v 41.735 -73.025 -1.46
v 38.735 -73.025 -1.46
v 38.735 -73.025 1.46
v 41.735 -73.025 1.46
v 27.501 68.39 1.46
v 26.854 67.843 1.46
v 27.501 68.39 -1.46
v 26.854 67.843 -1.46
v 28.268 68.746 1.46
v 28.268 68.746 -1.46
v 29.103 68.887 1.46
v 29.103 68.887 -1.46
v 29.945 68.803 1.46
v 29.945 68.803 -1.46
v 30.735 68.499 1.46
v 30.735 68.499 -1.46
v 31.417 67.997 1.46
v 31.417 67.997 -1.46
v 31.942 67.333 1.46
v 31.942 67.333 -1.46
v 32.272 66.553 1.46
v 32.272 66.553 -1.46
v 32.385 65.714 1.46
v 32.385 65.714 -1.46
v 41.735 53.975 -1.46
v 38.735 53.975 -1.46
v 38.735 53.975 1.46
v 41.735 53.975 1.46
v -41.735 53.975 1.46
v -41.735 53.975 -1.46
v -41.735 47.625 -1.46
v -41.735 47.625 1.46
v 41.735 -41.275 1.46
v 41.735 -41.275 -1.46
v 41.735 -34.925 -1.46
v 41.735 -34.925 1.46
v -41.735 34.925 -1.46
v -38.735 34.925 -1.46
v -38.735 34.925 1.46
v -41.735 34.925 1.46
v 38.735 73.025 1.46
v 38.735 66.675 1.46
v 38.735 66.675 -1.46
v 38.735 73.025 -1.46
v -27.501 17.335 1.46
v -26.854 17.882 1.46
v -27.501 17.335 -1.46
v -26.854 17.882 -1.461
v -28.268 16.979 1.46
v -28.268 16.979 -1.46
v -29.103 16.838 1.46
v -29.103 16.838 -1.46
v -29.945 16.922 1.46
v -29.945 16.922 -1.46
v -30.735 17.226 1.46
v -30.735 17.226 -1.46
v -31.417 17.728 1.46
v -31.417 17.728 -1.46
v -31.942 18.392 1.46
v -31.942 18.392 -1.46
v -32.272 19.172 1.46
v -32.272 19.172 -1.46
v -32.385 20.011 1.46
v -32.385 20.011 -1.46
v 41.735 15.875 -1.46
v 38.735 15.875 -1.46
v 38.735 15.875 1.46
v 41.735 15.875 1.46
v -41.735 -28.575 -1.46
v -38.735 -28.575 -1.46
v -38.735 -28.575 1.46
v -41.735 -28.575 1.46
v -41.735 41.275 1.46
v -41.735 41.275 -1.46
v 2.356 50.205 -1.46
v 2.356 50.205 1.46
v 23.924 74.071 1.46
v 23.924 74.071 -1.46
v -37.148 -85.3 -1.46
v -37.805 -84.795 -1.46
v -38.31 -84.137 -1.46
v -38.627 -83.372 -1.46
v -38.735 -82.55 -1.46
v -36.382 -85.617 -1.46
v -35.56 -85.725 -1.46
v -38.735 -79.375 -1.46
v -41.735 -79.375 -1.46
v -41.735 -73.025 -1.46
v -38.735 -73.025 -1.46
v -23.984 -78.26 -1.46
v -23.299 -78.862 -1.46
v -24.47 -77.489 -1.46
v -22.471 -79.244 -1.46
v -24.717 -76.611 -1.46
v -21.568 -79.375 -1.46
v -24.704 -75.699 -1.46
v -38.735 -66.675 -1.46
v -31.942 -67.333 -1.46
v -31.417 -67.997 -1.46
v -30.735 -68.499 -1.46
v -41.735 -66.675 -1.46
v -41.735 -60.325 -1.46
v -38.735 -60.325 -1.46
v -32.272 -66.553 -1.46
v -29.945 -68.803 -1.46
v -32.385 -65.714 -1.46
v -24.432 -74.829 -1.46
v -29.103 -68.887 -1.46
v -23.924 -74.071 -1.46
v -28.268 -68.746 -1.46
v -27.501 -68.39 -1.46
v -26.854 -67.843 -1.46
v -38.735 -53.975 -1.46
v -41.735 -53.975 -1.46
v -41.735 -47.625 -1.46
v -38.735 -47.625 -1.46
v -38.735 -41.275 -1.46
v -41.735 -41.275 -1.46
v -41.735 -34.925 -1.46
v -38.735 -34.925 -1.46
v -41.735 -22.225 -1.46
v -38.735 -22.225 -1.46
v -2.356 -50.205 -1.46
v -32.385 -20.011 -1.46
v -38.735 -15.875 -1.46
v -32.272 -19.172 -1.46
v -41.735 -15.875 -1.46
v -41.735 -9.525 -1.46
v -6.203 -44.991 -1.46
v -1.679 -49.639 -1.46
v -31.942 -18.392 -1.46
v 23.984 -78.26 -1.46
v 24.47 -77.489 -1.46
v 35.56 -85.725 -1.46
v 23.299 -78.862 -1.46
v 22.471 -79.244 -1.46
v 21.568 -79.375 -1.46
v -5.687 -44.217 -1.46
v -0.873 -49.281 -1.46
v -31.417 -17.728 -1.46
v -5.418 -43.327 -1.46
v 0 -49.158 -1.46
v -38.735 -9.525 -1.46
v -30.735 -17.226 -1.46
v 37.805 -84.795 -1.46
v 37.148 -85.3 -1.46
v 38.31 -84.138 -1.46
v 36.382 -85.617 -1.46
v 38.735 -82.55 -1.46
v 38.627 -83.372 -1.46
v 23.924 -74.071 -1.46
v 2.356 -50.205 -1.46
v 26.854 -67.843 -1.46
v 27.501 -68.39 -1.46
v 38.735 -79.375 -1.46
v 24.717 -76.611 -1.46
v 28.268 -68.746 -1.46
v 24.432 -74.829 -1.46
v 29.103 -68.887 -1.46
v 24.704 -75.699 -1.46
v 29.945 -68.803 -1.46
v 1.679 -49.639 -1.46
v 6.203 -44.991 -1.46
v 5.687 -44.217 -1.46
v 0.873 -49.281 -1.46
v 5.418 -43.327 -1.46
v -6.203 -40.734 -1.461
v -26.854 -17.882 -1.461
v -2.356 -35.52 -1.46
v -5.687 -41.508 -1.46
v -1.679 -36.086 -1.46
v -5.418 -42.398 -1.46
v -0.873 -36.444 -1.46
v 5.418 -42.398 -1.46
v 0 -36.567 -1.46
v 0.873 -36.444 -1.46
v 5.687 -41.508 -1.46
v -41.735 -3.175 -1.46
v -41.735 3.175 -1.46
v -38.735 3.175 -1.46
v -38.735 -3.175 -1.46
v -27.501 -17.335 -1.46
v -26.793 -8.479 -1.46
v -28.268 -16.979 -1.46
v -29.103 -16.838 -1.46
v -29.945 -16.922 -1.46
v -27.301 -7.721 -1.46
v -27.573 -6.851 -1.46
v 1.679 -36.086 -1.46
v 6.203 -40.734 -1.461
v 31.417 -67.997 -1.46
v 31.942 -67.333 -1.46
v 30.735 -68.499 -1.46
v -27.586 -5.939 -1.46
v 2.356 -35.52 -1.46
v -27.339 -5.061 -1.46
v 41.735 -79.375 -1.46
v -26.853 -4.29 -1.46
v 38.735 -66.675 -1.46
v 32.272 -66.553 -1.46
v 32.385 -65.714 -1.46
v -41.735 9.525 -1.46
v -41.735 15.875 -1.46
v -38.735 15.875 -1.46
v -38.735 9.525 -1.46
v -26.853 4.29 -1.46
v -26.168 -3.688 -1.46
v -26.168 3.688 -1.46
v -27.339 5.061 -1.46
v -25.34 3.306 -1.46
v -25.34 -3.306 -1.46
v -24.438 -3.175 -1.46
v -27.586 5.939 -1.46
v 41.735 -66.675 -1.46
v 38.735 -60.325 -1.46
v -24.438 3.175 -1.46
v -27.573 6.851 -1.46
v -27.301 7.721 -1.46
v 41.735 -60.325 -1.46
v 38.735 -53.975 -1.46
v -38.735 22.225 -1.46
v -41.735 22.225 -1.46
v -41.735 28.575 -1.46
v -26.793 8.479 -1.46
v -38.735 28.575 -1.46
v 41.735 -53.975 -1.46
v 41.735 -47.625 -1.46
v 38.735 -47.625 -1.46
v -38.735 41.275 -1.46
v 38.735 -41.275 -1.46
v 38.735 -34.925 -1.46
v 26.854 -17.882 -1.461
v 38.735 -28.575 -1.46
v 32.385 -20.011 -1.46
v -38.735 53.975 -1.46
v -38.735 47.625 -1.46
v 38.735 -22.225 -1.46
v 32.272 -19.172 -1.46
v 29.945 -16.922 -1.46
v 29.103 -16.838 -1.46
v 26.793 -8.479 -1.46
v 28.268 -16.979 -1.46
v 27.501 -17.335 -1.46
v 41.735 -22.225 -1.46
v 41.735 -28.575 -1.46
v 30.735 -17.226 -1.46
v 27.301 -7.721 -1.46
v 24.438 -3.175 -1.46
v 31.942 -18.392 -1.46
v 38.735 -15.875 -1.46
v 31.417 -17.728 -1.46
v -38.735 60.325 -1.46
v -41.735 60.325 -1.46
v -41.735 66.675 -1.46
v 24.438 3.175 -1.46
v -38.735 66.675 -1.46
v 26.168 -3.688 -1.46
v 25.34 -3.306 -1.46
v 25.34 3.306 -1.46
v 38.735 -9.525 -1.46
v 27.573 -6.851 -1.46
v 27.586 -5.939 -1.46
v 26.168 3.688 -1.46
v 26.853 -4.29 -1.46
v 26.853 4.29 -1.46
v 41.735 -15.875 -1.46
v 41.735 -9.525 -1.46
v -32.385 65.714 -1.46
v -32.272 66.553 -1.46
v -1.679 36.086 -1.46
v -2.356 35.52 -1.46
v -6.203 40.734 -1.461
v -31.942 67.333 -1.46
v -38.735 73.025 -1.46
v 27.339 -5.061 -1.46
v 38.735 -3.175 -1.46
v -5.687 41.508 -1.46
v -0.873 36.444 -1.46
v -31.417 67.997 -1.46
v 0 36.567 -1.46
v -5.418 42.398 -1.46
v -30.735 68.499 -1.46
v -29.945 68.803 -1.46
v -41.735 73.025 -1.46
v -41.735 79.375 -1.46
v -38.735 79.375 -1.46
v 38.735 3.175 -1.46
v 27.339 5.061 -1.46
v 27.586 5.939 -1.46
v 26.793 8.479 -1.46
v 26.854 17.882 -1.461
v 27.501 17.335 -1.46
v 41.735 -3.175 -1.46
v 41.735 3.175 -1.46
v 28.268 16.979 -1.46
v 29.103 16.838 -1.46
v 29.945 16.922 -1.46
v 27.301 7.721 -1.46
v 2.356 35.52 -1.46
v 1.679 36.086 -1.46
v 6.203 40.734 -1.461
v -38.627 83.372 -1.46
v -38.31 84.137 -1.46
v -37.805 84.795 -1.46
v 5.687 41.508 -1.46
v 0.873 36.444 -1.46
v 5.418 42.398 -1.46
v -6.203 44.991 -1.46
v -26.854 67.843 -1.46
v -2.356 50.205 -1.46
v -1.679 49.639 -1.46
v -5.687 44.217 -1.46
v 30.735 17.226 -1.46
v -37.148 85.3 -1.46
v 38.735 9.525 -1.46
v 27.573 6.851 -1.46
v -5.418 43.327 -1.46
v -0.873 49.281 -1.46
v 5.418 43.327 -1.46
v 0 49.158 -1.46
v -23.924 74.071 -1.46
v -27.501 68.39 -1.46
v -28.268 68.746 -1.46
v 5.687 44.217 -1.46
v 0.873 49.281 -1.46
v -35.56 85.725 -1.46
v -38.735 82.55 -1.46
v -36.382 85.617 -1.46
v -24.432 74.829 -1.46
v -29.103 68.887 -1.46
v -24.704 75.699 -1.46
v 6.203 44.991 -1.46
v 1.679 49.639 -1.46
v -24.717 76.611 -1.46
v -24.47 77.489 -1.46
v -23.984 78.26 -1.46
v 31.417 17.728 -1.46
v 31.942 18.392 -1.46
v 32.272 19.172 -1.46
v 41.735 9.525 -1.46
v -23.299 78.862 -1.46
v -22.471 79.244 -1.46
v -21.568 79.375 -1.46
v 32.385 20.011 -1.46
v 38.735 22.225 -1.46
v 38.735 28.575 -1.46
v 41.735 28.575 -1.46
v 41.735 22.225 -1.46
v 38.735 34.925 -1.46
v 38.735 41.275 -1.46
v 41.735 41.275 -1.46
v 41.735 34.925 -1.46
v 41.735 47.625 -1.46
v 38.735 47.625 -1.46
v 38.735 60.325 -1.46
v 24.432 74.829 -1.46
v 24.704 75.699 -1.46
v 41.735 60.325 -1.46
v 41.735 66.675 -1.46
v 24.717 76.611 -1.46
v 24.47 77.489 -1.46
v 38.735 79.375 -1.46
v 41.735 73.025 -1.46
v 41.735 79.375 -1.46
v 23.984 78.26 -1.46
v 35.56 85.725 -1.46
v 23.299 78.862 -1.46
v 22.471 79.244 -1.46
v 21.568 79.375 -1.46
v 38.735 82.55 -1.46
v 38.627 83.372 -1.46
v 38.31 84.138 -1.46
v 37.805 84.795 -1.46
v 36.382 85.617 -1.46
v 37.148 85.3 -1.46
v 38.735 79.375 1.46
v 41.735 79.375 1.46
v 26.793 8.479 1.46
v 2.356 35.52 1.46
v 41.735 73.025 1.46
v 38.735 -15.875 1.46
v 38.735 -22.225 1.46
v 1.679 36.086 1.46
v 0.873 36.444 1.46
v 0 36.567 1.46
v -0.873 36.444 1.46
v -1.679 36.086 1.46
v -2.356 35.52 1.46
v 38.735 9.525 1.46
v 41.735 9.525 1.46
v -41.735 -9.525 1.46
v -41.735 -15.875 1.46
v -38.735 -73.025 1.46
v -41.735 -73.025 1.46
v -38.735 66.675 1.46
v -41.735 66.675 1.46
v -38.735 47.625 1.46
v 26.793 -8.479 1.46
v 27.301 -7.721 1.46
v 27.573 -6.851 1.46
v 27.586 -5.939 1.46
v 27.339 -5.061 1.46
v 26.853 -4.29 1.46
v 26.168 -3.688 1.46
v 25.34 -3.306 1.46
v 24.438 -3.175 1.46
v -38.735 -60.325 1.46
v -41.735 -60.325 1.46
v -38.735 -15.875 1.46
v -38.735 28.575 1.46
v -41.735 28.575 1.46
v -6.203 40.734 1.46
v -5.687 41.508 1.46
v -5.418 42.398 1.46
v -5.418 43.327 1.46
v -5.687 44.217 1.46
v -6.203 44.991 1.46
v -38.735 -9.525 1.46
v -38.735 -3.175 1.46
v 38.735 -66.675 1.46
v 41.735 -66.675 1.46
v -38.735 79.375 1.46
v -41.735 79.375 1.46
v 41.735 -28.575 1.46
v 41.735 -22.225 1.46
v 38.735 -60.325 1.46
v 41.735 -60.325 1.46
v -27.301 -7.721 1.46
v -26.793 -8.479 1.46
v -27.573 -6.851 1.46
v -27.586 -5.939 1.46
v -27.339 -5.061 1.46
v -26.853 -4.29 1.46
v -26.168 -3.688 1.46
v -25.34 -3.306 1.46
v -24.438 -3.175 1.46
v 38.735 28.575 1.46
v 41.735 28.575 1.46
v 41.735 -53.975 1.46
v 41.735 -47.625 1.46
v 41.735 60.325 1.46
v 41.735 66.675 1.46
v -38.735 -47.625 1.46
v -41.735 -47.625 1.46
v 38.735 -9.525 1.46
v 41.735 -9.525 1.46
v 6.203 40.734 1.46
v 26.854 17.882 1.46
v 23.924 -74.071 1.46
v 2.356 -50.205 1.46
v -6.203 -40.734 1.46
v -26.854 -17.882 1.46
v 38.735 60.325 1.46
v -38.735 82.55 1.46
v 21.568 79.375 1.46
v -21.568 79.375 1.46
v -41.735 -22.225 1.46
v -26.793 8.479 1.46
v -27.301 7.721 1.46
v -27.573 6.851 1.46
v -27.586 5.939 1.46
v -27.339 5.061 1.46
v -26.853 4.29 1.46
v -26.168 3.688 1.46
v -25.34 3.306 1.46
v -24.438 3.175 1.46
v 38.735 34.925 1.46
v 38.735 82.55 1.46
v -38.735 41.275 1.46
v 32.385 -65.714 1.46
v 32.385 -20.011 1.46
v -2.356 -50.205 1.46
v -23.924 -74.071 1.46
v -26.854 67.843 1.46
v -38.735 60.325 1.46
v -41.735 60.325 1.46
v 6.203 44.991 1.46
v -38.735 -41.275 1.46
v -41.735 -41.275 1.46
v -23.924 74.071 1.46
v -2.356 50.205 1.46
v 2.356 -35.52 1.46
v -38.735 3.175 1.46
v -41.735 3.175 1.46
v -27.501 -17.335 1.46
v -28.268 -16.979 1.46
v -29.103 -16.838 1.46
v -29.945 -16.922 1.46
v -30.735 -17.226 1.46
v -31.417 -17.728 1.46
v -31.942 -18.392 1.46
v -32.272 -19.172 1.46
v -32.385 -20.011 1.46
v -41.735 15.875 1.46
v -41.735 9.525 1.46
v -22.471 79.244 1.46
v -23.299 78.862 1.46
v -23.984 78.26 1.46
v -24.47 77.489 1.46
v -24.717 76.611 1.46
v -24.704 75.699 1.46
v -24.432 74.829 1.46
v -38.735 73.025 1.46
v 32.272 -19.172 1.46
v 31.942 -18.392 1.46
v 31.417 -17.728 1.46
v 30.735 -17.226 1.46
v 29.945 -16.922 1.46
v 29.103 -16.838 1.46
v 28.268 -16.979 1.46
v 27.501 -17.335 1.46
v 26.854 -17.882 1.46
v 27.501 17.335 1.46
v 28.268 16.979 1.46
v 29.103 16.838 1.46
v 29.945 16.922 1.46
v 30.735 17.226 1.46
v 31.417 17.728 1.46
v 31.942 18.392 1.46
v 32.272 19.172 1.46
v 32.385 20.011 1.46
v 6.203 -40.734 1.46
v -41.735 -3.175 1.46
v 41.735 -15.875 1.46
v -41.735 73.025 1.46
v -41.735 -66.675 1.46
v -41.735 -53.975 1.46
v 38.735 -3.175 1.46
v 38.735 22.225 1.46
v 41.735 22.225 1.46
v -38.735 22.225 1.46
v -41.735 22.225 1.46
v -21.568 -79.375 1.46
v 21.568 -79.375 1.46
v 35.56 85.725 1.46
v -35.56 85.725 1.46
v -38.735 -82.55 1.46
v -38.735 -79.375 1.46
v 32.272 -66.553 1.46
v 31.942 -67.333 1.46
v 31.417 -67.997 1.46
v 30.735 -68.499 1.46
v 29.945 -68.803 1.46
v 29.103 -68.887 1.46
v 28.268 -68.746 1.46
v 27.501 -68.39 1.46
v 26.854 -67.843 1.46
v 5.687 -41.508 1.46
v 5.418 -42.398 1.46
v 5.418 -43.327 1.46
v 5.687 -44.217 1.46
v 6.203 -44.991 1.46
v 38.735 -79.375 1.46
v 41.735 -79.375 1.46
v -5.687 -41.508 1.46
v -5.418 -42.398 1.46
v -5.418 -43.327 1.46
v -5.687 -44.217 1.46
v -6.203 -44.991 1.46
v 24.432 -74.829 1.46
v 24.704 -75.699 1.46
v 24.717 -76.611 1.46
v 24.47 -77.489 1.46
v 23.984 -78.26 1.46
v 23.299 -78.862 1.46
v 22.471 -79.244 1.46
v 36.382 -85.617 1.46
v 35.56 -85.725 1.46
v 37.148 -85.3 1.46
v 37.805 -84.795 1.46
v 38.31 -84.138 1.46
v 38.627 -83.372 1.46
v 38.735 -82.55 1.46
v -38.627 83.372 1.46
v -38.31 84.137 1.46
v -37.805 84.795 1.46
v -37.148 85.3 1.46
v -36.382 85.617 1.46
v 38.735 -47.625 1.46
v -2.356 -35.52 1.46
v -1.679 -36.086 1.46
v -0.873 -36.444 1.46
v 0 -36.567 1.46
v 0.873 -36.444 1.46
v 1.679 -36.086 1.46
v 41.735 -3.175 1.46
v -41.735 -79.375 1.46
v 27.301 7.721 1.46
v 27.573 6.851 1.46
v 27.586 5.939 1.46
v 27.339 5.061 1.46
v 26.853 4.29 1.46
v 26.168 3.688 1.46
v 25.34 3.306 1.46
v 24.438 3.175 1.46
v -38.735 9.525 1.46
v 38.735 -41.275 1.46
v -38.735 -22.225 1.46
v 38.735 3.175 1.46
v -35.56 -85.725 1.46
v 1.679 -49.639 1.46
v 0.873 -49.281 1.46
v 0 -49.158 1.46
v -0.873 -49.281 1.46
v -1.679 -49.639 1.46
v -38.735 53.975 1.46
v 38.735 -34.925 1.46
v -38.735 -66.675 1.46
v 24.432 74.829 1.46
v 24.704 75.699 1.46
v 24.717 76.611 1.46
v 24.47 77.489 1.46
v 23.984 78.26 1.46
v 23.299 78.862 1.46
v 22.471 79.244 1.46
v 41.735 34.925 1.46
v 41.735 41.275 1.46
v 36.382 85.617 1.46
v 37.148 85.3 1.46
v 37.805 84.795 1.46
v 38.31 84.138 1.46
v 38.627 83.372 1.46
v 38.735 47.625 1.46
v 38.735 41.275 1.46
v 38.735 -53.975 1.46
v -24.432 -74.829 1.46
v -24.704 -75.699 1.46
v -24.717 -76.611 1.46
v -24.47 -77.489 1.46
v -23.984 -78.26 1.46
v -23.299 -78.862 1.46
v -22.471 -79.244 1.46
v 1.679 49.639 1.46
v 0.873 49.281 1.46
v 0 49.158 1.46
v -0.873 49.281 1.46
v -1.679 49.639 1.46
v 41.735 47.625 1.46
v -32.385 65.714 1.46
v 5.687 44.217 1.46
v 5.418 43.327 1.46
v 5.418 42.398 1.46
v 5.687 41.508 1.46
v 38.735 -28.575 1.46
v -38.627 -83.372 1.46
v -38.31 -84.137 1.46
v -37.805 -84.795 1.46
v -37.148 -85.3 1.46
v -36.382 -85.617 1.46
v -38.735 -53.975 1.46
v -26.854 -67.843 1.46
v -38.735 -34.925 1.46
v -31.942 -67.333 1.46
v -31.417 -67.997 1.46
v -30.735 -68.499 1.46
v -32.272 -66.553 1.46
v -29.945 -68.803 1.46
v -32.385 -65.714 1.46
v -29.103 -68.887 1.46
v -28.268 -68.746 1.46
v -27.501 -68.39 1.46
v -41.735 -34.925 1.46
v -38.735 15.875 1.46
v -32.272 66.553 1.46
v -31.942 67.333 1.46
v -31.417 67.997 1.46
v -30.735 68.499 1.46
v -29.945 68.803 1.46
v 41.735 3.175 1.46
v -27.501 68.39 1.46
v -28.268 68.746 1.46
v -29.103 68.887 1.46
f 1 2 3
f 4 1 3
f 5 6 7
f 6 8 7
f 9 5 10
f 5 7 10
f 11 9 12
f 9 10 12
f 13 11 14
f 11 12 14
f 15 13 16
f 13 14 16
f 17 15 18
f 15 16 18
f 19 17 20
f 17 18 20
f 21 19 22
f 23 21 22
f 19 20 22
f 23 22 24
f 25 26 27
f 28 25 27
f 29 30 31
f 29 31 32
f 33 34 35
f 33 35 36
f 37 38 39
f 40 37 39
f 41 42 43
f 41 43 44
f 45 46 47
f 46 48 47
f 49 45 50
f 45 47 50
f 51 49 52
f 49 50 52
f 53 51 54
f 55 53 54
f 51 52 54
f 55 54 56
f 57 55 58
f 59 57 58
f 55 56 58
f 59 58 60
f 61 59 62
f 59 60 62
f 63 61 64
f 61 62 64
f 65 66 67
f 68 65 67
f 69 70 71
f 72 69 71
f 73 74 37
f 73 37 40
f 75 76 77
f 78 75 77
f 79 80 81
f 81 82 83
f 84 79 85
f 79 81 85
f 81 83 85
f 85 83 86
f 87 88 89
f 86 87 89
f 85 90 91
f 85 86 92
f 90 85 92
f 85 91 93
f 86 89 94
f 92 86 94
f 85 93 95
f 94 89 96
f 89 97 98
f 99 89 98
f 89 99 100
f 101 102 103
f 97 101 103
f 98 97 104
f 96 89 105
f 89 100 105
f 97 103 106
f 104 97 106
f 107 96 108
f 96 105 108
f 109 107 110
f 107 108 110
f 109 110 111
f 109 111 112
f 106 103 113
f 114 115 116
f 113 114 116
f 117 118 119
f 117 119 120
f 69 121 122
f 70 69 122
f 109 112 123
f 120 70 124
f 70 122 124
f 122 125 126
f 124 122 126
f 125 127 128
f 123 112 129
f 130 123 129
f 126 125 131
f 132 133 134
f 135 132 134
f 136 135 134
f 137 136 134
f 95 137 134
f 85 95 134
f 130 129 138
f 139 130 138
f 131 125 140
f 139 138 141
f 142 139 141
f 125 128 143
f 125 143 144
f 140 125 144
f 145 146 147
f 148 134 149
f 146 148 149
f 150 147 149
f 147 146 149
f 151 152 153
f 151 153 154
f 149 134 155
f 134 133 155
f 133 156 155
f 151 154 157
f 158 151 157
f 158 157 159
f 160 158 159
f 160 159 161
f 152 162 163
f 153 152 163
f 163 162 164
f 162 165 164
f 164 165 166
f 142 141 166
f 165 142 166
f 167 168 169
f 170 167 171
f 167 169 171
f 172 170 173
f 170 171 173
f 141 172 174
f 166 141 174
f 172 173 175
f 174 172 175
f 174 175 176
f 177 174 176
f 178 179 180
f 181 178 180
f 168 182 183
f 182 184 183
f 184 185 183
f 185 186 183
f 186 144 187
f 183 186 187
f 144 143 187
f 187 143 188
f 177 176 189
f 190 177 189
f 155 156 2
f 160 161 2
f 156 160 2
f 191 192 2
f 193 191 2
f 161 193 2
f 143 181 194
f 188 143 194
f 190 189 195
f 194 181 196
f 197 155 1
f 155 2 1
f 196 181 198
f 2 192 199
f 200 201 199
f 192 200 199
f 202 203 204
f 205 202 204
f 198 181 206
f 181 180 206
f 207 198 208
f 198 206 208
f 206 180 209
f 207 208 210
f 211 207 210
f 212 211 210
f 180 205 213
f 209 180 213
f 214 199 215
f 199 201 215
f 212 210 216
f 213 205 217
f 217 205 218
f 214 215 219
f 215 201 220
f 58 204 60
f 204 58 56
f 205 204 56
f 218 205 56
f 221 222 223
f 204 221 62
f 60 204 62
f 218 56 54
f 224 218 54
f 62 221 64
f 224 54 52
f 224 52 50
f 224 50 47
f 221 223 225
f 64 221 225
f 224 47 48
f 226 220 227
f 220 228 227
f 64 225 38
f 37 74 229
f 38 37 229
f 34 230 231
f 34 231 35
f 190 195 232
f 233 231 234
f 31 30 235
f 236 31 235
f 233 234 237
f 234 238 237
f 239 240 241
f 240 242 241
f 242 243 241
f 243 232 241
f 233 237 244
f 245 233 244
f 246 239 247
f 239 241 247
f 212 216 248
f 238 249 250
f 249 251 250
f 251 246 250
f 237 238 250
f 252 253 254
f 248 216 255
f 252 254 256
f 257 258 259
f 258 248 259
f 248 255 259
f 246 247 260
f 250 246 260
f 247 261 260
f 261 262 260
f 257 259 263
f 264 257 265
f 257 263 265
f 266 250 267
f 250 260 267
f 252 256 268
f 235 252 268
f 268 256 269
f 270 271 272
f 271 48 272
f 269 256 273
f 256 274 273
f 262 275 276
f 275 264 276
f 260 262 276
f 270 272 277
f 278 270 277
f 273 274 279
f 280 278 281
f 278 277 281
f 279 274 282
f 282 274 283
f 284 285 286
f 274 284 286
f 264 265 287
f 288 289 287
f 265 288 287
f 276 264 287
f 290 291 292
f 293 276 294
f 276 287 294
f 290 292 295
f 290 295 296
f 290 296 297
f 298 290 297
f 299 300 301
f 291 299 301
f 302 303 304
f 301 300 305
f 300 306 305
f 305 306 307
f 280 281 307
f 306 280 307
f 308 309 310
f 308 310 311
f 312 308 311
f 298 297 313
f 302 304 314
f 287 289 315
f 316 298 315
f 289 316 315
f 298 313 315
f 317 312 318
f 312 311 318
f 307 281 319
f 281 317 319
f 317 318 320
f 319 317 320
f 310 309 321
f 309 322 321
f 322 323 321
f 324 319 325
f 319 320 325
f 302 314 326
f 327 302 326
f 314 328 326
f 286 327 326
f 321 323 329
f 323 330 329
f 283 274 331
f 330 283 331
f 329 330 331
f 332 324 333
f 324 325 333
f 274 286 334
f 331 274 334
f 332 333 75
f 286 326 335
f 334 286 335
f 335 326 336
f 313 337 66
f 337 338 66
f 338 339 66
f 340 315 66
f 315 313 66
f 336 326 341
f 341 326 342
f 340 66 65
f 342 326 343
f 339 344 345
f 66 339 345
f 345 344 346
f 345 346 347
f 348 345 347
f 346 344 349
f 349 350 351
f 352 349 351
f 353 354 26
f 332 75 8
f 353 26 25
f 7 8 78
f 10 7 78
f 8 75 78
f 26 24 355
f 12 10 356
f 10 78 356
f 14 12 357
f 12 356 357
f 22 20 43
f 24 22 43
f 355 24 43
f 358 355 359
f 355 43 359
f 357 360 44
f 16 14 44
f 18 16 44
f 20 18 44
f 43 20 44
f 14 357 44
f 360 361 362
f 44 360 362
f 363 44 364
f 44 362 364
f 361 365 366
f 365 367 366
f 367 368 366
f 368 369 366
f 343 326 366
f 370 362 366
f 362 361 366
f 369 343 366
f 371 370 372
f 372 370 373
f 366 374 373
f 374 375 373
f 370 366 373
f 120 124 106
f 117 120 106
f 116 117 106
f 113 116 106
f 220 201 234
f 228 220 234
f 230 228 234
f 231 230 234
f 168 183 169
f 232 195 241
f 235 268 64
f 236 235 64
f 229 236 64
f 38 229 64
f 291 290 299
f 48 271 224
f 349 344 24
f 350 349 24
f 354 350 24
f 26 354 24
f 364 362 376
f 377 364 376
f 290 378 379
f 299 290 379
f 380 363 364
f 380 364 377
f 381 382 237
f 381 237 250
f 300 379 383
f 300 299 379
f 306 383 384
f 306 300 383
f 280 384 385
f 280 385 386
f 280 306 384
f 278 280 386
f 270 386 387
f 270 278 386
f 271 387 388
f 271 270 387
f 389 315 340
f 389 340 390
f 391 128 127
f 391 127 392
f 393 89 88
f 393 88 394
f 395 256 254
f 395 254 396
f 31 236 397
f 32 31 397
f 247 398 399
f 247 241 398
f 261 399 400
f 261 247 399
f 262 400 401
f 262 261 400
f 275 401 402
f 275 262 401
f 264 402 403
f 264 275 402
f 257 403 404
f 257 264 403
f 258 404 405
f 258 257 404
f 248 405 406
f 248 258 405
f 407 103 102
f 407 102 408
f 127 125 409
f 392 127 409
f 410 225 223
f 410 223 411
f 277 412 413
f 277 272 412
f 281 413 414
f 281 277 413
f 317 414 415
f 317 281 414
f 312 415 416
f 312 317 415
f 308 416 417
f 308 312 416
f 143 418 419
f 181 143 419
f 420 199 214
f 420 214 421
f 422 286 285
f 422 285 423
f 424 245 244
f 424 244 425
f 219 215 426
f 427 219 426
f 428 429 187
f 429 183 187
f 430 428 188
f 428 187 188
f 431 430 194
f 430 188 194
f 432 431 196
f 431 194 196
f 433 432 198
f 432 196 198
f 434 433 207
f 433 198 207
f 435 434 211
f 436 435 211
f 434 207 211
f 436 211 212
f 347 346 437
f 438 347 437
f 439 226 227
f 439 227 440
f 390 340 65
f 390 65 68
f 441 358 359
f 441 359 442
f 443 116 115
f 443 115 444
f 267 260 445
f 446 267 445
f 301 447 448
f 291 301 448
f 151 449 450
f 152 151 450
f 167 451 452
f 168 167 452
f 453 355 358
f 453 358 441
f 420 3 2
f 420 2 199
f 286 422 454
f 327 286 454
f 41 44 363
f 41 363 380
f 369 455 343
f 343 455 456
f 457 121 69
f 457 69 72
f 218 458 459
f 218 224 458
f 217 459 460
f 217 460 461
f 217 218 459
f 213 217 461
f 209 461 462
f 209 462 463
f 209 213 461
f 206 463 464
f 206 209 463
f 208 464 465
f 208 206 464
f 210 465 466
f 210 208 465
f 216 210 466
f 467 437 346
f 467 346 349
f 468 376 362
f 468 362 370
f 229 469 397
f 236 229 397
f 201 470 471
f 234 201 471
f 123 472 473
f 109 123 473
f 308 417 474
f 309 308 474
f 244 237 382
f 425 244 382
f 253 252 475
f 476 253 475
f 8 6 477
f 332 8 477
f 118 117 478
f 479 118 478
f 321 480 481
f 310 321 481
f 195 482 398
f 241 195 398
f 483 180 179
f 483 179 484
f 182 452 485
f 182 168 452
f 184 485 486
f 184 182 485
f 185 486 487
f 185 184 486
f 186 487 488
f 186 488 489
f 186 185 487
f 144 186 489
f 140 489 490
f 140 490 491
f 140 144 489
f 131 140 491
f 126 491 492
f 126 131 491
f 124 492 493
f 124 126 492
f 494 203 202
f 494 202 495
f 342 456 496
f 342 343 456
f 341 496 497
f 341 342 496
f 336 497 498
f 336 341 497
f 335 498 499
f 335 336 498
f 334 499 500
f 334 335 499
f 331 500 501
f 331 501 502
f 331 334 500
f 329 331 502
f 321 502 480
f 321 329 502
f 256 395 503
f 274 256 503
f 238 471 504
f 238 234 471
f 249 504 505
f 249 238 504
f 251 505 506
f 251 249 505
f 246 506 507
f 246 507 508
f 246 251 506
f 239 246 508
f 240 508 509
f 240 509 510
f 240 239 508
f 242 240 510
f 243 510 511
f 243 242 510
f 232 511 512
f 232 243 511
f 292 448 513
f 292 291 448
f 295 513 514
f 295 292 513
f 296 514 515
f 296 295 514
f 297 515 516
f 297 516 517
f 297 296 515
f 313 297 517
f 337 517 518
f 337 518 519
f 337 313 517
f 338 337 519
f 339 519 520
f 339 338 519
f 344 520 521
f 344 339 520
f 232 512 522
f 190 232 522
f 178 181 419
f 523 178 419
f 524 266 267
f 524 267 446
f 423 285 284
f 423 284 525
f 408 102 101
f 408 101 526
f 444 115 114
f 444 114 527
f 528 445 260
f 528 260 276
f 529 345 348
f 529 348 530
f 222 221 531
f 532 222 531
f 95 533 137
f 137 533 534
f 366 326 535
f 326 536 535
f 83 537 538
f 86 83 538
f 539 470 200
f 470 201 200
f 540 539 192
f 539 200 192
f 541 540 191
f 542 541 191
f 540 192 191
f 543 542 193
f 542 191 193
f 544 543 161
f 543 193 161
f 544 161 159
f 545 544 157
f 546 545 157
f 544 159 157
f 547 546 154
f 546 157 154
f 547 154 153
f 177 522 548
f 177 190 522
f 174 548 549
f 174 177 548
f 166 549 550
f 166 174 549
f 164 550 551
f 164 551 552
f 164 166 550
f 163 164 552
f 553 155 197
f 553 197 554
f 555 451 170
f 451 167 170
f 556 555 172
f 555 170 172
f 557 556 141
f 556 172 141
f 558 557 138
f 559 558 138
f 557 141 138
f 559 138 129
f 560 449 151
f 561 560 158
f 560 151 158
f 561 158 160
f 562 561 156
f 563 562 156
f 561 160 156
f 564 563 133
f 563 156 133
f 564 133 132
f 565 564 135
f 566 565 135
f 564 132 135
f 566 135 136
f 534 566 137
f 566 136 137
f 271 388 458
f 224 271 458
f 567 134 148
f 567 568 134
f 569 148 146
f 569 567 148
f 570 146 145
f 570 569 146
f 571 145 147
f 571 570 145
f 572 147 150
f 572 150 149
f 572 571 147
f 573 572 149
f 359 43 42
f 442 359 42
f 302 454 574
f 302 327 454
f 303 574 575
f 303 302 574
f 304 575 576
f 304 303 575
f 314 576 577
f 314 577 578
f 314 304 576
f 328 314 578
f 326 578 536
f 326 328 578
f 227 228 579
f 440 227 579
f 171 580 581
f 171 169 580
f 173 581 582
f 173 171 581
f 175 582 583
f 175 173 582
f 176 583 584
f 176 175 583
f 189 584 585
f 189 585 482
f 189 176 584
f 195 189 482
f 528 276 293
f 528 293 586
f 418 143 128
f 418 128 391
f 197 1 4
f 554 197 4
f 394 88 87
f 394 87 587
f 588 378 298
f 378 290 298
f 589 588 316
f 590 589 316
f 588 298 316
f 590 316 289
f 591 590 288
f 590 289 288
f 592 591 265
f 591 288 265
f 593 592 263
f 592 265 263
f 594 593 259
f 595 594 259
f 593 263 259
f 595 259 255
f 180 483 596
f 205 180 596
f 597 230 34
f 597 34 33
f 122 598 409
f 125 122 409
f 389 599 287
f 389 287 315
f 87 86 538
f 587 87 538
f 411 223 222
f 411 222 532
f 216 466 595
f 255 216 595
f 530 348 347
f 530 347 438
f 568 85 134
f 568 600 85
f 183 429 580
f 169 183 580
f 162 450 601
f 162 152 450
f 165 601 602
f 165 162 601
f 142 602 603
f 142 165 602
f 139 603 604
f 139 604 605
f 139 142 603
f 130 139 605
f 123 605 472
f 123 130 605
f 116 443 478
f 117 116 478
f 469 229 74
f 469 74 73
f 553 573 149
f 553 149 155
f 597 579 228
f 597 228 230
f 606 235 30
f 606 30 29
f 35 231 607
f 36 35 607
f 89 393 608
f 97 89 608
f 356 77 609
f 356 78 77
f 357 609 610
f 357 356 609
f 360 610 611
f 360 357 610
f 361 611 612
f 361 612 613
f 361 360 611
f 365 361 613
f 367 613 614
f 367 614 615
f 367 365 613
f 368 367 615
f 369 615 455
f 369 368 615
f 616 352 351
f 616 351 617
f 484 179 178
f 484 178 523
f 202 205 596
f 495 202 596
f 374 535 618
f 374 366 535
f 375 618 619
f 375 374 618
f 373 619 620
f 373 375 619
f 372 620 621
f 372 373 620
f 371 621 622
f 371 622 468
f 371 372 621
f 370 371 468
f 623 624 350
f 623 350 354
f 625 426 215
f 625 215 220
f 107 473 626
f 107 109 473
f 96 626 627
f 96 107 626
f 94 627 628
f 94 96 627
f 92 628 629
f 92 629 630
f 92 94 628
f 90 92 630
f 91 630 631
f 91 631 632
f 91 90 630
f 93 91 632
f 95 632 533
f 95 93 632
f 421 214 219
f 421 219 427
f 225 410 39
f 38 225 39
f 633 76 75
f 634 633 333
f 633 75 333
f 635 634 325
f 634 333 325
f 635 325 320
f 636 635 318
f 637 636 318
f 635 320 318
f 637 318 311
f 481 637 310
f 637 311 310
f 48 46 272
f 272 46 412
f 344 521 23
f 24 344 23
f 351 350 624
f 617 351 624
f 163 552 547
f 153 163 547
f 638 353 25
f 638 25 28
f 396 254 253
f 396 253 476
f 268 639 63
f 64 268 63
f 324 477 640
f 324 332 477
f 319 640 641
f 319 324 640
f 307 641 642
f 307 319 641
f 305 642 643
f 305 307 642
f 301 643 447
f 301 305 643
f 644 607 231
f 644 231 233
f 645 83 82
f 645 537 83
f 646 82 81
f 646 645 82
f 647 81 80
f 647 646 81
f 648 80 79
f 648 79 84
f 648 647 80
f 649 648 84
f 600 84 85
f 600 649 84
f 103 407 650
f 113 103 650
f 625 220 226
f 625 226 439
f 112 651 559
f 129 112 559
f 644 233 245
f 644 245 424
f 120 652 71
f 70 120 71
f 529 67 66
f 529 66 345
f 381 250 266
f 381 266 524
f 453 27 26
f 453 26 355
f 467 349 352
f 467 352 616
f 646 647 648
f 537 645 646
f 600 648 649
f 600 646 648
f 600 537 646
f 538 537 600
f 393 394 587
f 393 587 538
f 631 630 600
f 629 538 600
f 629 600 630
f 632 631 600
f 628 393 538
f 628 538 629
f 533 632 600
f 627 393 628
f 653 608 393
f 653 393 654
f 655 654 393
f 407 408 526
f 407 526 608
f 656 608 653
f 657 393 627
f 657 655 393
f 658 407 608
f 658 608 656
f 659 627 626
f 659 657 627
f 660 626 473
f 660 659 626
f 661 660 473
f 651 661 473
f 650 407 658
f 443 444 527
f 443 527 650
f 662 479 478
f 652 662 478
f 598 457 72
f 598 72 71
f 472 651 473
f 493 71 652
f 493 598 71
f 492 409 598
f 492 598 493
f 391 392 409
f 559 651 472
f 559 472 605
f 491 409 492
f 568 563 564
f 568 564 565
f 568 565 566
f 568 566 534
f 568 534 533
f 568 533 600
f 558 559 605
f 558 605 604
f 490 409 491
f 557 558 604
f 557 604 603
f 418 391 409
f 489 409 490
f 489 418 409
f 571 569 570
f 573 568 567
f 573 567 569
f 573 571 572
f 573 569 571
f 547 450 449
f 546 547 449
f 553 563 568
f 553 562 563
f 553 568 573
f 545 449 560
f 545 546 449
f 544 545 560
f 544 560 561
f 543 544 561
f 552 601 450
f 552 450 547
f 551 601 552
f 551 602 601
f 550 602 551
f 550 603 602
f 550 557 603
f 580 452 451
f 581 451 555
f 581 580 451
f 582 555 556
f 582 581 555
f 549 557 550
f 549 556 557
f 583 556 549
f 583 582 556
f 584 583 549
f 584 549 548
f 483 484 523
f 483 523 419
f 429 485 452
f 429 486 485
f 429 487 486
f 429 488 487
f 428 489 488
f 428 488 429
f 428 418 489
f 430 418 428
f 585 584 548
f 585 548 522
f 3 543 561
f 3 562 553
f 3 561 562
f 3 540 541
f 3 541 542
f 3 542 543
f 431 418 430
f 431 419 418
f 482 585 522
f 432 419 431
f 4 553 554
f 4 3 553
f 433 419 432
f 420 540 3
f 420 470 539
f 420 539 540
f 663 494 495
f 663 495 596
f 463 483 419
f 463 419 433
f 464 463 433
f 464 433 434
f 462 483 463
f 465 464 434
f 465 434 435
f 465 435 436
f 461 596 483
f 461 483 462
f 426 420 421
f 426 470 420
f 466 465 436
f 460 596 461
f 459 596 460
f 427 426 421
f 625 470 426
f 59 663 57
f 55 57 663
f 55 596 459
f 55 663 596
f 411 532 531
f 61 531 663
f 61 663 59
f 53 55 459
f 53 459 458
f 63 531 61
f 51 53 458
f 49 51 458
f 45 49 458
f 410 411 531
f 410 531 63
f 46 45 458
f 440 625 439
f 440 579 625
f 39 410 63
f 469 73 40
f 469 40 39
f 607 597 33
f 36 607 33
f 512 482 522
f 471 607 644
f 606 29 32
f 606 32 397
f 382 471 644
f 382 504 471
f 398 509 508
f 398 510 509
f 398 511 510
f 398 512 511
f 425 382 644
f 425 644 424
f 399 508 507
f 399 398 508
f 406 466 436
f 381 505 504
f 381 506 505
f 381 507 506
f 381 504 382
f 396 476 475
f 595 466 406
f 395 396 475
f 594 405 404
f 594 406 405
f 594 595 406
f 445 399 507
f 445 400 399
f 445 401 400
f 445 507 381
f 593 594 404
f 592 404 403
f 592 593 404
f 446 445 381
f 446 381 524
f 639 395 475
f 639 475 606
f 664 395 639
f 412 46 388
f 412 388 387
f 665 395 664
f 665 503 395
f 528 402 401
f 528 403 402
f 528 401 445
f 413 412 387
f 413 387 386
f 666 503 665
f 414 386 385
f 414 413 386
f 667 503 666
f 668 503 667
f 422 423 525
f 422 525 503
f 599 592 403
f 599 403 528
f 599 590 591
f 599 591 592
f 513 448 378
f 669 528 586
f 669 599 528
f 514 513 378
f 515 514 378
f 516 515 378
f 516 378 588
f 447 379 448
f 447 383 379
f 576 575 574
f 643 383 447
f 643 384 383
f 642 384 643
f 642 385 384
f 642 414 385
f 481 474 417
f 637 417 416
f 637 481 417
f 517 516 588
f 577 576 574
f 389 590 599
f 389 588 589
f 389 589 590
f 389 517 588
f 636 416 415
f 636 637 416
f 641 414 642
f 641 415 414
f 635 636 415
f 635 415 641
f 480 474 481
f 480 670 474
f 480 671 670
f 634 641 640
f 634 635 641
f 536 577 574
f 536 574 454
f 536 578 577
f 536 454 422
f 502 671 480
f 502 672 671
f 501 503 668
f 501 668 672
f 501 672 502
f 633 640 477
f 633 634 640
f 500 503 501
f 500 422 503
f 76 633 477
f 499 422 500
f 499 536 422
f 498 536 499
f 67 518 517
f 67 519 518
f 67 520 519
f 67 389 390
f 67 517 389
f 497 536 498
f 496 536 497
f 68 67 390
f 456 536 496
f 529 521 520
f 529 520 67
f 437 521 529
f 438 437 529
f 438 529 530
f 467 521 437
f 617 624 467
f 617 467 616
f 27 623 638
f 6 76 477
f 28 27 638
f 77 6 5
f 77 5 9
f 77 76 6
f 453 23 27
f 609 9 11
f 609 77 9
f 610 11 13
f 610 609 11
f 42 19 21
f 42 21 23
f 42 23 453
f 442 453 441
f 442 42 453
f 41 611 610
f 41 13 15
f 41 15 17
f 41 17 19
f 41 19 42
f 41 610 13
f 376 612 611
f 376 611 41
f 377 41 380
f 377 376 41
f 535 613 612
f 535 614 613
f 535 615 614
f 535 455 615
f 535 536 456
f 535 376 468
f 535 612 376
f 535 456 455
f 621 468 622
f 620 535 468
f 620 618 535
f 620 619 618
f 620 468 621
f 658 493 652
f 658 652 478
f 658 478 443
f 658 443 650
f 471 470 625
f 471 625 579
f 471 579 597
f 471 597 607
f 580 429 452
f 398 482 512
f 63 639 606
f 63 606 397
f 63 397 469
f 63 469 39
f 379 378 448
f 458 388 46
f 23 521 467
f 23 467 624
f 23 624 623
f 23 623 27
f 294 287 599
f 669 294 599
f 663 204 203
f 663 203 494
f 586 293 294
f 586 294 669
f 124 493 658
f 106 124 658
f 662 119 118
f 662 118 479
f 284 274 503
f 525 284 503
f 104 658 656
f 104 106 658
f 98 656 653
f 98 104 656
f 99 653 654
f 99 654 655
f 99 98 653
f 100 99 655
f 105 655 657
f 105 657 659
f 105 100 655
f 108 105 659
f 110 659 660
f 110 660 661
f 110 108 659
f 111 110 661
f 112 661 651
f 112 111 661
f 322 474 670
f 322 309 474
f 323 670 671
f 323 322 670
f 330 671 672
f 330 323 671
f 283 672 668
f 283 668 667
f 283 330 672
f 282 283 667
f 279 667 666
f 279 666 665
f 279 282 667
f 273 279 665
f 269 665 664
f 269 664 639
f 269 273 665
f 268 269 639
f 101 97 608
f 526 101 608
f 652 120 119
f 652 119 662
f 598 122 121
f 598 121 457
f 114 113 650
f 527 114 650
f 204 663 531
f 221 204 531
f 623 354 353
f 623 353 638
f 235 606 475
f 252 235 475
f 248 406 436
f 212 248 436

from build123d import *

# Parameters (mm, degrees)
SKETCH1_W                = 77.47
SKETCH1_H                = 171.45
BOSS_EXTRUDE1_DEPTH      = 1.4605
SKETCH3_W                = 2.921
SKETCH3_H                = 6.35
BOSS_EXTRUDE2_DEPTH      = 3
LPATTERN1_COUNT          = 13
LPATTERN1_PITCH          = 12.7
MIRROR1_COPY_1_SKETCH_W  = 2.921
MIRROR1_COPY_1_SKETCH_H  = 6.35
MIRROR1_COPY_1_DEPTH     = 3
MIRROR1_COPY_2_SKETCH_W  = 2.921
MIRROR1_COPY_2_SKETCH_H  = 6.35
MIRROR1_COPY_2_DEPTH     = 3
MIRROR1_COPY_3_SKETCH_W  = 2.921
MIRROR1_COPY_3_SKETCH_H  = 6.35
MIRROR1_COPY_3_DEPTH     = 3
MIRROR1_COPY_4_SKETCH_W  = 2.921
MIRROR1_COPY_4_SKETCH_H  = 6.35
MIRROR1_COPY_4_DEPTH     = 3
MIRROR1_COPY_5_SKETCH_W  = 2.921
MIRROR1_COPY_5_SKETCH_H  = 6.35
MIRROR1_COPY_5_DEPTH     = 3
MIRROR1_COPY_6_SKETCH_W  = 2.921
MIRROR1_COPY_6_SKETCH_H  = 6.35
MIRROR1_COPY_6_DEPTH     = 3
MIRROR1_COPY_7_SKETCH_W  = 2.921
MIRROR1_COPY_7_SKETCH_H  = 6.35
MIRROR1_COPY_7_DEPTH     = 3
MIRROR1_COPY_8_SKETCH_W  = 2.921
MIRROR1_COPY_8_SKETCH_H  = 6.35
MIRROR1_COPY_8_DEPTH     = 3
MIRROR1_COPY_9_SKETCH_W  = 2.921
MIRROR1_COPY_9_SKETCH_H  = 6.35
MIRROR1_COPY_9_DEPTH     = 3
MIRROR1_COPY_10_SKETCH_W = 2.921
MIRROR1_COPY_10_SKETCH_H = 6.35
MIRROR1_COPY_10_DEPTH    = 3
MIRROR1_COPY_11_SKETCH_W = 2.921
MIRROR1_COPY_11_SKETCH_H = 6.35
MIRROR1_COPY_11_DEPTH    = 3
MIRROR1_COPY_12_SKETCH_W = 2.921
MIRROR1_COPY_12_SKETCH_H = 6.35
MIRROR1_COPY_12_DEPTH    = 3
CUT_EXTRUDE1_DEPTH       = 96.389297571
FILLET1_R                = 3.175
FILLET2_R                = 3.175


with BuildPart() as part:
    # Sketch1 → Boss-Extrude1 (new, symmetric)
    with BuildSketch(Plane.XY):
        Rectangle(SKETCH1_W, SKETCH1_H)
    extrude(amount=BOSS_EXTRUDE1_DEPTH, both=True)

    # Sketch3 → Boss-Extrude2 (add)
    with BuildSketch(Plane.ZY.offset(38.735)):
        with Locations((0, -76.2)):
            Rectangle(SKETCH3_W, SKETCH3_H)
    boss_extrude2 = extrude(amount=BOSS_EXTRUDE2_DEPTH)

    # LPattern1: Boss-Extrude2 ×13
    with Locations(*[(0, i * LPATTERN1_PITCH, 0) for i in range(1, LPATTERN1_COUNT)]):
        add(boss_extrude2)

    # Mirror1: Boss-Extrude2 across plane
    add(boss_extrude2.mirror(Plane.ZY))

    # Mirror1 copy 1 sketch → Mirror1 copy 1 (add)
    with BuildSketch(Plane(origin=(38.735, 12.7, 0), x_dir=(0, 0, 1), z_dir=(1, 0, 0))):
        with Locations((0, 76.2)):
            Rectangle(MIRROR1_COPY_1_SKETCH_W, MIRROR1_COPY_1_SKETCH_H)
    extrude(amount=MIRROR1_COPY_1_DEPTH)

    # Mirror1 copy 2 sketch → Mirror1 copy 2 (add)
    with BuildSketch(Plane(origin=(38.735, 25.4, 0), x_dir=(0, 0, 1), z_dir=(1, 0, 0))):
        with Locations((0, 76.2)):
            Rectangle(MIRROR1_COPY_2_SKETCH_W, MIRROR1_COPY_2_SKETCH_H)
    extrude(amount=MIRROR1_COPY_2_DEPTH)

    # Mirror1 copy 3 sketch → Mirror1 copy 3 (add)
    with BuildSketch(Plane(origin=(38.735, 38.1, 0), x_dir=(0, 0, 1), z_dir=(1, 0, 0))):
        with Locations((0, 76.2)):
            Rectangle(MIRROR1_COPY_3_SKETCH_W, MIRROR1_COPY_3_SKETCH_H)
    extrude(amount=MIRROR1_COPY_3_DEPTH)

    # Mirror1 copy 4 sketch → Mirror1 copy 4 (add)
    with BuildSketch(Plane(origin=(38.735, 50.8, 0), x_dir=(0, 0, 1), z_dir=(1, 0, 0))):
        with Locations((0, 76.2)):
            Rectangle(MIRROR1_COPY_4_SKETCH_W, MIRROR1_COPY_4_SKETCH_H)
    extrude(amount=MIRROR1_COPY_4_DEPTH)

    # Mirror1 copy 5 sketch → Mirror1 copy 5 (add)
    with BuildSketch(Plane(origin=(38.735, 63.5, 0), x_dir=(0, 0, 1), z_dir=(1, 0, 0))):
        with Locations((0, 76.2)):
            Rectangle(MIRROR1_COPY_5_SKETCH_W, MIRROR1_COPY_5_SKETCH_H)
    extrude(amount=MIRROR1_COPY_5_DEPTH)

    # Mirror1 copy 6 sketch → Mirror1 copy 6 (add)
    with BuildSketch(Plane(origin=(38.735, 76.2, 0), x_dir=(0, 0, 1), z_dir=(1, 0, 0))):
        with Locations((0, 76.2)):
            Rectangle(MIRROR1_COPY_6_SKETCH_W, MIRROR1_COPY_6_SKETCH_H)
    extrude(amount=MIRROR1_COPY_6_DEPTH)

    # Mirror1 copy 7 sketch → Mirror1 copy 7 (add)
    with BuildSketch(Plane(origin=(38.735, 88.9, 0), x_dir=(0, 0, 1), z_dir=(1, 0, 0))):
        with Locations((0, 76.2)):
            Rectangle(MIRROR1_COPY_7_SKETCH_W, MIRROR1_COPY_7_SKETCH_H)
    extrude(amount=MIRROR1_COPY_7_DEPTH)

    # Mirror1 copy 8 sketch → Mirror1 copy 8 (add)
    with BuildSketch(Plane(origin=(38.735, 101.6, 0), x_dir=(0, 0, 1), z_dir=(1, 0, 0))):
        with Locations((0, 76.2)):
            Rectangle(MIRROR1_COPY_8_SKETCH_W, MIRROR1_COPY_8_SKETCH_H)
    extrude(amount=MIRROR1_COPY_8_DEPTH)

    # Mirror1 copy 9 sketch → Mirror1 copy 9 (add)
    with BuildSketch(Plane(origin=(38.735, 114.3, 0), x_dir=(0, 0, 1), z_dir=(1, 0, 0))):
        with Locations((0, 76.2)):
            Rectangle(MIRROR1_COPY_9_SKETCH_W, MIRROR1_COPY_9_SKETCH_H)
    extrude(amount=MIRROR1_COPY_9_DEPTH)

    # Mirror1 copy 10 sketch → Mirror1 copy 10 (add)
    with BuildSketch(Plane(origin=(38.735, 127, 0), x_dir=(0, 0, 1), z_dir=(1, 0, 0))):
        with Locations((0, 76.2)):
            Rectangle(MIRROR1_COPY_10_SKETCH_W, MIRROR1_COPY_10_SKETCH_H)
    extrude(amount=MIRROR1_COPY_10_DEPTH)

    # Mirror1 copy 11 sketch → Mirror1 copy 11 (add)
    with BuildSketch(Plane(origin=(38.735, 139.7, 0), x_dir=(0, 0, 1), z_dir=(1, 0, 0))):
        with Locations((0, 76.2)):
            Rectangle(MIRROR1_COPY_11_SKETCH_W, MIRROR1_COPY_11_SKETCH_H)
    extrude(amount=MIRROR1_COPY_11_DEPTH)

    # Mirror1 copy 12 sketch → Mirror1 copy 12 (add)
    with BuildSketch(Plane(origin=(38.735, 152.4, 0), x_dir=(0, 0, 1), z_dir=(1, 0, 0))):
        with Locations((0, 76.2)):
            Rectangle(MIRROR1_COPY_12_SKETCH_W, MIRROR1_COPY_12_SKETCH_H)
    extrude(amount=MIRROR1_COPY_12_DEPTH)

    # Sketch4 → Cut-Extrude1 (cut, through all)
    with BuildSketch(Plane.XY.offset(1.4605)):
        Polygon((0, 47.597902846), (28.717080391, 79.375), (-28.717080391, 79.375), align=None)
        Polygon((-32.385, 11.762042191), (-4.279401091, 42.8625), (-32.385, 73.962957809), align=None)
        Polygon((32.385, 73.962957809), (4.279401091, 42.8625), (32.385, 11.762042191), align=None)
        Polygon((31.58633965, 3.175), (0, 38.127097154), (-31.58633965, 3.175), align=None)
        Polygon((-31.58633965, -3.175), (0, -38.127097154), (31.58633965, -3.175), align=None)
        Polygon((-4.279401091, -42.8625), (-32.385, -11.762042191), (-32.385, -73.962957809), align=None)
        Polygon((28.717080391, -79.375), (0, -47.597902846), (-28.717080391, -79.375), align=None)
        Polygon((32.385, -73.962957809), (32.385, -11.762042191), (4.279401091, -42.8625), align=None)
    extrude(amount=-CUT_EXTRUDE1_DEPTH, mode=Mode.SUBTRACT)

    # Fillet1
    fillet1_edges = [part.edges().sort_by_distance(p)[0] for p in [
        (-31.58633965, -3.175, 0),
        (31.58633965, -3.175, 0),
        (0, -38.127097154, 0),
        (-31.58633965, 3.175, 0),
        (0, 38.127097154, 0),
        (31.58633965, 3.175, 0),
        (32.385, 73.962957809, 0),
        (32.385, 11.762042191, 0),
        (4.279401091, 42.8625, 0),
        (-32.385, 73.962957809, 0),
        (-4.279401091, 42.8625, 0),
        (-32.385, 11.762042191, 0),
        (32.385, -11.762042191, 0),
        (32.385, -73.962957809, 0),
        (4.279401091, -42.8625, 0),
        (-32.385, -11.762042191, 0),
        (-4.279401091, -42.8625, 0),
        (-32.385, -73.962957809, 0),
        (-28.717080391, -79.375, 0),
        (0, -47.597902846, 0),
        (28.717080391, -79.375, 0),
        (-28.717080391, 79.375, 0),
        (28.717080391, 79.375, 0),
        (0, 47.597902846, 0),
    ]]
    fillet(fillet1_edges, radius=FILLET1_R)

    # Fillet2
    fillet2_edges = [part.edges().sort_by_distance(p)[0] for p in [
        (-38.735, 85.725, 0),
        (38.735, 85.725, 0),
        (38.735, -85.725, 0),
        (-38.735, -85.725, 0),
    ]]
    fillet(fillet2_edges, radius=FILLET2_R)


solid = part.part
